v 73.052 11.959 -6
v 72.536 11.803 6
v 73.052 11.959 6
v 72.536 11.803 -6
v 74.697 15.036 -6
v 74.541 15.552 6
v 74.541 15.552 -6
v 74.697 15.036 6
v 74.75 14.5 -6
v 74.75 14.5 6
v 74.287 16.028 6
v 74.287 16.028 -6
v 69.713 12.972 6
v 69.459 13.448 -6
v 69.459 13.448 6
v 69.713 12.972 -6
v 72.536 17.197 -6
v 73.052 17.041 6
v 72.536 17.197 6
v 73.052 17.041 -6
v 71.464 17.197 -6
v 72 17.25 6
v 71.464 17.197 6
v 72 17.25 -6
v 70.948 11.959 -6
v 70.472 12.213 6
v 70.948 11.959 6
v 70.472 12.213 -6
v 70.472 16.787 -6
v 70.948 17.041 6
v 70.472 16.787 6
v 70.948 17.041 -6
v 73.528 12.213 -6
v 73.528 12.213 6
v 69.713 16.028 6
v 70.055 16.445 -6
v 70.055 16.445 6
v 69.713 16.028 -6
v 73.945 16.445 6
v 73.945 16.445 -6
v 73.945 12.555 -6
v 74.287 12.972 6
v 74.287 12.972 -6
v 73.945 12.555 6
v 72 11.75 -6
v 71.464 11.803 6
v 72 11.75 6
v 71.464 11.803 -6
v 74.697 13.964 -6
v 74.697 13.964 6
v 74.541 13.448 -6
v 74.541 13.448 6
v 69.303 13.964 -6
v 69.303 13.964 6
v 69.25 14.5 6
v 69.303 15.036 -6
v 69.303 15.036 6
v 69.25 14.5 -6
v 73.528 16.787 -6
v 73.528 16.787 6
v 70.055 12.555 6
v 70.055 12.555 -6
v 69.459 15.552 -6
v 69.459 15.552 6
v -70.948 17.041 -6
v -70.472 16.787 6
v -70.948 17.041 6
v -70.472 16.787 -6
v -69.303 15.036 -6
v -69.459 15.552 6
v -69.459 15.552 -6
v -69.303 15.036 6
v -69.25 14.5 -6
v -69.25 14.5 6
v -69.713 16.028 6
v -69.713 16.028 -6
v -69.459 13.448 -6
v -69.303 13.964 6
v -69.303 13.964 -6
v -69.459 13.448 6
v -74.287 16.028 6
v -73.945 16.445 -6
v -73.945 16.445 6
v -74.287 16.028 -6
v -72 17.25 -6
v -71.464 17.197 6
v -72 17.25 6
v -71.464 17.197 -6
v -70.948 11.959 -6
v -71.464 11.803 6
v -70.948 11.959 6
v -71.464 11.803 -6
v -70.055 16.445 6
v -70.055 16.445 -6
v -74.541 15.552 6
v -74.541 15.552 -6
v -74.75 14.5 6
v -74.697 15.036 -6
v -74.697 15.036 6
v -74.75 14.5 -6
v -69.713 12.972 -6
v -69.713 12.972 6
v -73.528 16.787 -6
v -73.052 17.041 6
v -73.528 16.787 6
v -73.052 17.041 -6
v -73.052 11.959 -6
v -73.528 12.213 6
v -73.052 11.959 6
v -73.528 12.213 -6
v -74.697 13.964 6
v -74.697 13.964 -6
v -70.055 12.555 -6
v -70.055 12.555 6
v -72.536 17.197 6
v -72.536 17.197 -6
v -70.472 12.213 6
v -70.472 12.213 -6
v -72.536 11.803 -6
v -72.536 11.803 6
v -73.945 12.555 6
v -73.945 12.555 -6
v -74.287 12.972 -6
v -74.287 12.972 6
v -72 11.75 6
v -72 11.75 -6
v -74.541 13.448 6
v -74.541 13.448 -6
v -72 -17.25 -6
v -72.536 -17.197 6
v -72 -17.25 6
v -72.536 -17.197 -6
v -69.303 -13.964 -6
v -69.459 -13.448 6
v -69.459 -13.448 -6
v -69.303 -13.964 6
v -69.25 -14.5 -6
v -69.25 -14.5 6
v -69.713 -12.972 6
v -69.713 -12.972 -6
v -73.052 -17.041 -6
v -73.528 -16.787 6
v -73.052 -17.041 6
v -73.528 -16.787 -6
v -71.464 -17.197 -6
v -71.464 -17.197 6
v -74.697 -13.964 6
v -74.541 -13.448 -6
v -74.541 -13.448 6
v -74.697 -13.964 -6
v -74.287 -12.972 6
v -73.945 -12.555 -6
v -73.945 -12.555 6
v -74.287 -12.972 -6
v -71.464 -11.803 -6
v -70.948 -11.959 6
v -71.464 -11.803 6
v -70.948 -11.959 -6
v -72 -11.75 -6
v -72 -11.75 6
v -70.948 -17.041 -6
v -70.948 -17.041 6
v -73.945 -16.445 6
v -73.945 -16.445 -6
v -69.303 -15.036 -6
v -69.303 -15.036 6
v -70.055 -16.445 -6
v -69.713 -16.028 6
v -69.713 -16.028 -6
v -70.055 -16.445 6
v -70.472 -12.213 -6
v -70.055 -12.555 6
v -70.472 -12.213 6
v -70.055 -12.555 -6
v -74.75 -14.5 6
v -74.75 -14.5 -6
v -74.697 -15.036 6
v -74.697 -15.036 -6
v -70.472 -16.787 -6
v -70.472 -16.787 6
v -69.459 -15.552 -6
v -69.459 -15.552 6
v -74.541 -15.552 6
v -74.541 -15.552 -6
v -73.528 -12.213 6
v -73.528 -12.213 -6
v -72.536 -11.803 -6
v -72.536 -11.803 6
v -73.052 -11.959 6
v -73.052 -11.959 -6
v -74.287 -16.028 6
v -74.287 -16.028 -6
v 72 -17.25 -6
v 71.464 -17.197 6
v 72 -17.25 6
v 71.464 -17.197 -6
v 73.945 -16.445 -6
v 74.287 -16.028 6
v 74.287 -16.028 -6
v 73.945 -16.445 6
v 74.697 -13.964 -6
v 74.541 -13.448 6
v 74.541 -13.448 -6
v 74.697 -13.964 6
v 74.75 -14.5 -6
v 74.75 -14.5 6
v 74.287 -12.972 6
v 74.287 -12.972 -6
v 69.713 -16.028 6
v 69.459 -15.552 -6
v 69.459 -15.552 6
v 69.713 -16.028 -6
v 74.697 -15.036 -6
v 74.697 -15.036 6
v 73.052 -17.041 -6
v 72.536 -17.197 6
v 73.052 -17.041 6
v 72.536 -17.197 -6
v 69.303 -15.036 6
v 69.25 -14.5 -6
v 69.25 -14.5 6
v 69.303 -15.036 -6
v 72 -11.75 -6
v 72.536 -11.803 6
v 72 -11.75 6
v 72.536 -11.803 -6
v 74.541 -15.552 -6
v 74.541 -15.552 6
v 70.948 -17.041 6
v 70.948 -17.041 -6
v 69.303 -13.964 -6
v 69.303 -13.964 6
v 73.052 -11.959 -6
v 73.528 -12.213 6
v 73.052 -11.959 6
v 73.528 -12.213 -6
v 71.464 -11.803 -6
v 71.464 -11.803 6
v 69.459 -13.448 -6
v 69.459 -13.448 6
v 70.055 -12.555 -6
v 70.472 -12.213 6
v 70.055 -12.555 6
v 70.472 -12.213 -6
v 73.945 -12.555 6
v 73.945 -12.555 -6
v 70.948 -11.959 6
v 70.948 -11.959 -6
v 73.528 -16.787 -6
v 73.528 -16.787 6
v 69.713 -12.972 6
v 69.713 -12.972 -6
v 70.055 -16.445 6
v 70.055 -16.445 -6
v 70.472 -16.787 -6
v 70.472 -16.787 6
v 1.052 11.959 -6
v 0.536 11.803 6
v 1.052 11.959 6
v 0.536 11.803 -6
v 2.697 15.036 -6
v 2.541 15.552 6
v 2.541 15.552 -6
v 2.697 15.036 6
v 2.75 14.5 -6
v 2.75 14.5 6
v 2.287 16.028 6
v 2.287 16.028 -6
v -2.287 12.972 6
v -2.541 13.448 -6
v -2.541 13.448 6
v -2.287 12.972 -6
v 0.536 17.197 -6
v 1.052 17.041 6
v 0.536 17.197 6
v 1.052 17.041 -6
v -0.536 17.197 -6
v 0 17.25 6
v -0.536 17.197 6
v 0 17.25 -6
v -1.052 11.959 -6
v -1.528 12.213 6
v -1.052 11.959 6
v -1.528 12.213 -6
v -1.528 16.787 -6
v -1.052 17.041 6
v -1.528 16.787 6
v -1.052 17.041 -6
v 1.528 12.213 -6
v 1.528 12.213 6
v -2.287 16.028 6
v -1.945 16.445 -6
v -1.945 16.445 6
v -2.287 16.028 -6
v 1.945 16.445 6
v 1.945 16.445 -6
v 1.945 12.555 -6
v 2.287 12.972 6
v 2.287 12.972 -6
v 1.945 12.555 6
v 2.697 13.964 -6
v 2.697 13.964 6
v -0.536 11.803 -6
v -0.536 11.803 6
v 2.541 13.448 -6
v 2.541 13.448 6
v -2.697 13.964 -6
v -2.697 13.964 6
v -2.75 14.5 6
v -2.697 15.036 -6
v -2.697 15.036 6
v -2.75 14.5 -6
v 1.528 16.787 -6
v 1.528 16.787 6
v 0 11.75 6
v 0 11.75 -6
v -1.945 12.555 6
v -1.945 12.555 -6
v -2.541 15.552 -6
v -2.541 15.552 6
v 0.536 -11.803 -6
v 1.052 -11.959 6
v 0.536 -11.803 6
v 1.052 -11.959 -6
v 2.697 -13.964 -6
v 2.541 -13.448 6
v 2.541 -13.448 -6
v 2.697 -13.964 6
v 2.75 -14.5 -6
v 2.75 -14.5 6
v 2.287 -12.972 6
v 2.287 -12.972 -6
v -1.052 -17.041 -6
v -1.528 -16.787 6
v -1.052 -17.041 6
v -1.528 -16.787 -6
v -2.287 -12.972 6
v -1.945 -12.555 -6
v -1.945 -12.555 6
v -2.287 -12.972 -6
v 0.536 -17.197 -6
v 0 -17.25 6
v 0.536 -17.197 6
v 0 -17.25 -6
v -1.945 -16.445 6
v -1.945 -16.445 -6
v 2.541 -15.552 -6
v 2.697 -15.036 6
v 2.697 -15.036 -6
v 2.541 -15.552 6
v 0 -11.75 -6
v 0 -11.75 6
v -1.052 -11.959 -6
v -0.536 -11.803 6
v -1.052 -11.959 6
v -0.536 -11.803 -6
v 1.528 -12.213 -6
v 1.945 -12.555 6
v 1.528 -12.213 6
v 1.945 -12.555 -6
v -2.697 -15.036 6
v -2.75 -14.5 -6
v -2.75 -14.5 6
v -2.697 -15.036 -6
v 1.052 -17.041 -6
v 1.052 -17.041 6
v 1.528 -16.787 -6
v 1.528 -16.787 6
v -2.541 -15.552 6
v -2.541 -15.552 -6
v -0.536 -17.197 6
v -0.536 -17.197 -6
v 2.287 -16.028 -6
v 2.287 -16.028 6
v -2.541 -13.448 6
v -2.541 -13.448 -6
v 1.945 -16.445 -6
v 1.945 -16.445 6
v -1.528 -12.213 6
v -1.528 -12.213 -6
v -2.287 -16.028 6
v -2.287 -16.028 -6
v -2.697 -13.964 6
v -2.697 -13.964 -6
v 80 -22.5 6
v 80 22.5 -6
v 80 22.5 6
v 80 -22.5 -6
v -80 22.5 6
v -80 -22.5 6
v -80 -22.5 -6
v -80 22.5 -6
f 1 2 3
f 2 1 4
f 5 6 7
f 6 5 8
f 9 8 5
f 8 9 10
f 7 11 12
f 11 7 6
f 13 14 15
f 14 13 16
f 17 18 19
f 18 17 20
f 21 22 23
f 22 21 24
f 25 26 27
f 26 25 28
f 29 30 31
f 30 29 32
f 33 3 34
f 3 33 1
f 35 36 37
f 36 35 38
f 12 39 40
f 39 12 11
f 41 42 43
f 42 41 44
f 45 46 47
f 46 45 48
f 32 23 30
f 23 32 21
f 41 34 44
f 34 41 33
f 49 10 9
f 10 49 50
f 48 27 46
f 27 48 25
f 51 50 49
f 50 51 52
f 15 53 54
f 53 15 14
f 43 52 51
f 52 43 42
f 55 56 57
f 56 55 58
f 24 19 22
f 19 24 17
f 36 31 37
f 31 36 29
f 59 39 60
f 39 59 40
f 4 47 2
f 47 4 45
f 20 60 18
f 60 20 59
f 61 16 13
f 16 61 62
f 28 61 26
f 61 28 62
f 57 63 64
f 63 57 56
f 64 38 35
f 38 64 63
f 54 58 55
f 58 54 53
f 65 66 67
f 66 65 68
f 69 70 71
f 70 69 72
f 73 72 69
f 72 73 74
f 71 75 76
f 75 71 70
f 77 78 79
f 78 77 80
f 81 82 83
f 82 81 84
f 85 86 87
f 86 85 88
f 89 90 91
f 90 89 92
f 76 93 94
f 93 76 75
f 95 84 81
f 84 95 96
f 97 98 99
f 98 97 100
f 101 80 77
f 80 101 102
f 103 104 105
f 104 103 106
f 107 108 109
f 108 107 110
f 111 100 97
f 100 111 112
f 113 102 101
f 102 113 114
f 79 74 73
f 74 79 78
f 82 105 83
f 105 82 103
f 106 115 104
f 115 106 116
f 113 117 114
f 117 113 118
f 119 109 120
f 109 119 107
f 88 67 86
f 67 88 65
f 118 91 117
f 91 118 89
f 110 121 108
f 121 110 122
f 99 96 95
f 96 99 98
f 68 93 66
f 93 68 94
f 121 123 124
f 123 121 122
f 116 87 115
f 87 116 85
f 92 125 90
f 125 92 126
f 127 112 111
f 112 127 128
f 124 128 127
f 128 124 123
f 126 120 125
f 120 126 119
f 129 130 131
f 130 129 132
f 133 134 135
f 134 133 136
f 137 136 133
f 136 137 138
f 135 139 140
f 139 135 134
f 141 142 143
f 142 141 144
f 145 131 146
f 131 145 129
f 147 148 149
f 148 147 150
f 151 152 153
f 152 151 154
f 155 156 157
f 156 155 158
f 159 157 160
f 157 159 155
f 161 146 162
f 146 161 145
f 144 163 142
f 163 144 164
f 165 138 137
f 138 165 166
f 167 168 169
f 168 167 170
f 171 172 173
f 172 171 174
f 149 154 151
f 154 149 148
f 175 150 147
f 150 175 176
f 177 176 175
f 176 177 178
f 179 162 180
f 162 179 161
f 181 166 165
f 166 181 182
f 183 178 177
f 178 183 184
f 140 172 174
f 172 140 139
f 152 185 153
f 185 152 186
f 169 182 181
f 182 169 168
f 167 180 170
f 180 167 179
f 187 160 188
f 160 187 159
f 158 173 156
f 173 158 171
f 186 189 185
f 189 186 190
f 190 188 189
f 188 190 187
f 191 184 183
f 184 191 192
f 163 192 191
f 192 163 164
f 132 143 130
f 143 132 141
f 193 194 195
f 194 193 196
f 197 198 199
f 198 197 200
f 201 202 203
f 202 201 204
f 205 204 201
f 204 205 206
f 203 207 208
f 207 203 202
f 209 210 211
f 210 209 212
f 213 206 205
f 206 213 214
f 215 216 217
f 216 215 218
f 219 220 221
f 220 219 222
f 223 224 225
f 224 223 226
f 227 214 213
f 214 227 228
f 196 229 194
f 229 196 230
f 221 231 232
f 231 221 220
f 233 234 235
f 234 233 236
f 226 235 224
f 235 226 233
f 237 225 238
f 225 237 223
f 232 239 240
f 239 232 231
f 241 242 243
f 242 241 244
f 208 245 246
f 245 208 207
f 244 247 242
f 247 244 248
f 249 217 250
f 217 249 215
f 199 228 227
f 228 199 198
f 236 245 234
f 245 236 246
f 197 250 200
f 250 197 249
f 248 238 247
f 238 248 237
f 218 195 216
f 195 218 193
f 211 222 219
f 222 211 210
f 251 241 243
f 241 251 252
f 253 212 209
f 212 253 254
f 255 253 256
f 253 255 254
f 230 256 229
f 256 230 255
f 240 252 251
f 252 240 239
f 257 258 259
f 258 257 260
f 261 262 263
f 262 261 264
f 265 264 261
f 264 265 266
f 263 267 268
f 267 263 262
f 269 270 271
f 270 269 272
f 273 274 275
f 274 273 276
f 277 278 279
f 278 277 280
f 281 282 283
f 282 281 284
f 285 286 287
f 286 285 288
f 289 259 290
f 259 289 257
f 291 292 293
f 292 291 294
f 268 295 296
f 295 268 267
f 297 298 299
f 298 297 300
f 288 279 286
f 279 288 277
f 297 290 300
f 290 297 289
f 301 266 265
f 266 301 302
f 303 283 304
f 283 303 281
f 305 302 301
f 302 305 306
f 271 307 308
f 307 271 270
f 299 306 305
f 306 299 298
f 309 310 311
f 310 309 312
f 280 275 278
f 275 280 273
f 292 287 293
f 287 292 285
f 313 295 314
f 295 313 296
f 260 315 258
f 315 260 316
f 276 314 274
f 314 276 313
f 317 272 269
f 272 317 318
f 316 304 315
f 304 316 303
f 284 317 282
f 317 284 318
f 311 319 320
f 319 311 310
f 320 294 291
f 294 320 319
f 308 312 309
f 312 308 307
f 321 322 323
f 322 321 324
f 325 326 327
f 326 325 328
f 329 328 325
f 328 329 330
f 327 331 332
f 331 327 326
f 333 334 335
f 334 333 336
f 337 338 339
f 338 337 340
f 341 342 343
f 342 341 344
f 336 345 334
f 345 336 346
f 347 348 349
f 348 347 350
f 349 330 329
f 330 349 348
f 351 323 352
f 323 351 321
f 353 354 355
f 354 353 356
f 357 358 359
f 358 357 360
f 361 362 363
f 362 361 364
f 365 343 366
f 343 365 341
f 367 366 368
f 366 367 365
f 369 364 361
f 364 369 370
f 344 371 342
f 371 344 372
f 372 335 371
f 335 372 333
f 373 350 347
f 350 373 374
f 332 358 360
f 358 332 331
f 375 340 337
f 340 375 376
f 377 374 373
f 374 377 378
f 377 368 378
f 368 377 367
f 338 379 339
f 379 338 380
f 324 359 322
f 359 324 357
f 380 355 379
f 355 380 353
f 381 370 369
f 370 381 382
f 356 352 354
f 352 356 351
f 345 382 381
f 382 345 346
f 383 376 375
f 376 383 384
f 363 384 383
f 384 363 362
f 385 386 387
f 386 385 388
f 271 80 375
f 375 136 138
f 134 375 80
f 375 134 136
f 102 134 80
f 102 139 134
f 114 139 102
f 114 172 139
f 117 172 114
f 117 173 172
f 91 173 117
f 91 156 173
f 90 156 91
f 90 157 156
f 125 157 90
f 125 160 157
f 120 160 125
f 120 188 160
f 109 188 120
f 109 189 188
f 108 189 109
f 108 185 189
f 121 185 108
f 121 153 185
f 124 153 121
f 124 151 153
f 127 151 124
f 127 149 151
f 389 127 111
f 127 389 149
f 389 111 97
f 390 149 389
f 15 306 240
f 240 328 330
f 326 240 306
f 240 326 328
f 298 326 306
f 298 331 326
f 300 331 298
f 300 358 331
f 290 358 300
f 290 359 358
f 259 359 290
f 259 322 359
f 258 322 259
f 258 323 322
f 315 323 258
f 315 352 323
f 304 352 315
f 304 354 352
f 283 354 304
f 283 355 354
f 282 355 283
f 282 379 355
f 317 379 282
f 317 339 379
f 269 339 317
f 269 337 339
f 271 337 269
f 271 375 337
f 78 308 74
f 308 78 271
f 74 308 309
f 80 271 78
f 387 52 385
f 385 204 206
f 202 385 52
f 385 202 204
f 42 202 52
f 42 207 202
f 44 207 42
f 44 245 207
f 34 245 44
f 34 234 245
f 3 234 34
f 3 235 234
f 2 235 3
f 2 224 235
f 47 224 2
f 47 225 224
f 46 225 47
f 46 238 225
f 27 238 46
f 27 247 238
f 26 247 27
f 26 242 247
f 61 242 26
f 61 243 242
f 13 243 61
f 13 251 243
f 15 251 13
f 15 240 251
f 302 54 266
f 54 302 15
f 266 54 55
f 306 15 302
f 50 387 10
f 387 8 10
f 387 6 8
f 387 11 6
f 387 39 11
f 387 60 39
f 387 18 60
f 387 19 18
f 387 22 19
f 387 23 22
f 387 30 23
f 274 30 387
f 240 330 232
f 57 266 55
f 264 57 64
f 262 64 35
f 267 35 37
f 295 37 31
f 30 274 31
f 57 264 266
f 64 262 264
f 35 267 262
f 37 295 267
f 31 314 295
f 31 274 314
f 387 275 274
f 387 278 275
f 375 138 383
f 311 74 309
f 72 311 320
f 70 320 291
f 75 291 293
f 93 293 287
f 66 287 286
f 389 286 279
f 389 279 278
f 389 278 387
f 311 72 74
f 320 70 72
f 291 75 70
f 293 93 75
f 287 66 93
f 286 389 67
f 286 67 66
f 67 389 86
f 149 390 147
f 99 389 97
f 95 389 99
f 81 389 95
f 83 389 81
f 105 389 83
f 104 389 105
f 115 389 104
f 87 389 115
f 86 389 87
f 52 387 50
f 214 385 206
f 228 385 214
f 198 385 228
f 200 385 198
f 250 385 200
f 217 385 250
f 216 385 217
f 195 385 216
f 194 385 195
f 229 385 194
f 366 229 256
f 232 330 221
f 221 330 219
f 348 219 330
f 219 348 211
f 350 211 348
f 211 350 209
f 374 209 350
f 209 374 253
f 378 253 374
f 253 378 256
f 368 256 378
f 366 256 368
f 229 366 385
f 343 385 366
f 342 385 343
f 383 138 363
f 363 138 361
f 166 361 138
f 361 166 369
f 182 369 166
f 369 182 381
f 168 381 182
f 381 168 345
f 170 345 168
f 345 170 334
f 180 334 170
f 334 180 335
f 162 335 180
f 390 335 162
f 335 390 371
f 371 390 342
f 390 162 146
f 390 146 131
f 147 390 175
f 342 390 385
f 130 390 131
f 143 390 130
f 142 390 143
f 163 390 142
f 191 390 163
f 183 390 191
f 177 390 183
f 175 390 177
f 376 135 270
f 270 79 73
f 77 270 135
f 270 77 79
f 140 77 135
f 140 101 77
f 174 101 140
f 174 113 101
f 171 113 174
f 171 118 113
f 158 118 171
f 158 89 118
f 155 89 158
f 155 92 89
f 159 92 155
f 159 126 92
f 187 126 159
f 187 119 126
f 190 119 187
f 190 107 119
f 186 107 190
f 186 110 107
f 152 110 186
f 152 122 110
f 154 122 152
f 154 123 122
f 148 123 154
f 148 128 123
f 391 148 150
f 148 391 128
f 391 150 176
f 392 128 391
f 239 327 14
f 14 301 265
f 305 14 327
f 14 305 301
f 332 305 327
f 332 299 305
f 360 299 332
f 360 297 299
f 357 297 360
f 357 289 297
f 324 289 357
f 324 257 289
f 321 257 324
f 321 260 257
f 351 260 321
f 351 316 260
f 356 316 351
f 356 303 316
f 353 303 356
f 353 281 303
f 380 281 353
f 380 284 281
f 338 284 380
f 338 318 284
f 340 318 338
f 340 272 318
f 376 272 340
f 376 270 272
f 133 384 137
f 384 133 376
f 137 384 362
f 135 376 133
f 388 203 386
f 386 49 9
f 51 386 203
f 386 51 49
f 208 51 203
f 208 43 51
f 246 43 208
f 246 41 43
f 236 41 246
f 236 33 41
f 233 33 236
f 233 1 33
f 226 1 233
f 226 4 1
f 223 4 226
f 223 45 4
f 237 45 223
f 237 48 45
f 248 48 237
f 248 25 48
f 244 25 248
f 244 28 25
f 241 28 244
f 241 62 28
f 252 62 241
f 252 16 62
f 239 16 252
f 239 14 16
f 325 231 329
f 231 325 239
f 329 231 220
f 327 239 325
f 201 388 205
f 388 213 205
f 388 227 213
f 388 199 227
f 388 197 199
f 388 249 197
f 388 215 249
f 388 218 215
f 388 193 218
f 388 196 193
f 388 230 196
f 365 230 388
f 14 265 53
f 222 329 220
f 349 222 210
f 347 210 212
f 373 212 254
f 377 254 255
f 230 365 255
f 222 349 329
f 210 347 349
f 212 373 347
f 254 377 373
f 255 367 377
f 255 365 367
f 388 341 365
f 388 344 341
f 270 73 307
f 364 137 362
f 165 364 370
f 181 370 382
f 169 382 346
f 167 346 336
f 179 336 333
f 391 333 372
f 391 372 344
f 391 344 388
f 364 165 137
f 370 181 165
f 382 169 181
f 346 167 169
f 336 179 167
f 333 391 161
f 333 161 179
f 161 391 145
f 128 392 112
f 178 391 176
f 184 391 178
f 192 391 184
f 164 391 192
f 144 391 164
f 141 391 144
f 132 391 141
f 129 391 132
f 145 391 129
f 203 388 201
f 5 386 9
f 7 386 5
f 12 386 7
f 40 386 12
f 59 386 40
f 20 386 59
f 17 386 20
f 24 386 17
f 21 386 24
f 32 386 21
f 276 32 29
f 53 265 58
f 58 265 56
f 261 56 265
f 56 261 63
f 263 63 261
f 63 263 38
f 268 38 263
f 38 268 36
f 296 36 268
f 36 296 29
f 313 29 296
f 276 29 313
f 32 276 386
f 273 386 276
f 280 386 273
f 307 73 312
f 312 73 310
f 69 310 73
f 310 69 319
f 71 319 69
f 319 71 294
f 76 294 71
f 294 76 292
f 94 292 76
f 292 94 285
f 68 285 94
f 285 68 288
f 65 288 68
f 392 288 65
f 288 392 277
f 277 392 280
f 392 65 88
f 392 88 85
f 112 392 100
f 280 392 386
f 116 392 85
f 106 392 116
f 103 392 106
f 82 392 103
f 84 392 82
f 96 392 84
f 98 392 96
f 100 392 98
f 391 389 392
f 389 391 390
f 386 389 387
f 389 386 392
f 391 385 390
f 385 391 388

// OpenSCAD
$fn = 32;

// ----------------------------------------------------------------------
// Corner plate 160 x 45 x 12
// 6 holes, centres taken from the edge offset
// ----------------------------------------------------------------------

// --- parameters (mm) ---
plate = [160, 45, 12];  // overall size (x, y, z)
holes = 6;              // number of holes the drawing asks for
hole_d = 5.5;           // hole diameter
edge = 8;               // hole centre offset from the plate edge

// --- derived feature positions (mm) ---
corner_x = plate[0] / 2 - edge;  // = 72   corner hole X
corner_y = plate[1] / 2 - edge;  // = 14.5   corner hole Y
feature_centers = [
  [corner_x, corner_y],
  [-corner_x, corner_y],
  [-corner_x, -corner_y],
  [corner_x, -corner_y],
  [0, corner_y],
  [0, -corner_y]
];   // hole centres the loop below drills

// plate outline, every hole drilled through with the same cutters
difference() {
  cube(plate, center = true);
  for (centre = feature_centers)
    translate([centre[0], centre[1], 0])
      cylinder(d = hole_d, h = plate[2] + 2, center = true);
}
